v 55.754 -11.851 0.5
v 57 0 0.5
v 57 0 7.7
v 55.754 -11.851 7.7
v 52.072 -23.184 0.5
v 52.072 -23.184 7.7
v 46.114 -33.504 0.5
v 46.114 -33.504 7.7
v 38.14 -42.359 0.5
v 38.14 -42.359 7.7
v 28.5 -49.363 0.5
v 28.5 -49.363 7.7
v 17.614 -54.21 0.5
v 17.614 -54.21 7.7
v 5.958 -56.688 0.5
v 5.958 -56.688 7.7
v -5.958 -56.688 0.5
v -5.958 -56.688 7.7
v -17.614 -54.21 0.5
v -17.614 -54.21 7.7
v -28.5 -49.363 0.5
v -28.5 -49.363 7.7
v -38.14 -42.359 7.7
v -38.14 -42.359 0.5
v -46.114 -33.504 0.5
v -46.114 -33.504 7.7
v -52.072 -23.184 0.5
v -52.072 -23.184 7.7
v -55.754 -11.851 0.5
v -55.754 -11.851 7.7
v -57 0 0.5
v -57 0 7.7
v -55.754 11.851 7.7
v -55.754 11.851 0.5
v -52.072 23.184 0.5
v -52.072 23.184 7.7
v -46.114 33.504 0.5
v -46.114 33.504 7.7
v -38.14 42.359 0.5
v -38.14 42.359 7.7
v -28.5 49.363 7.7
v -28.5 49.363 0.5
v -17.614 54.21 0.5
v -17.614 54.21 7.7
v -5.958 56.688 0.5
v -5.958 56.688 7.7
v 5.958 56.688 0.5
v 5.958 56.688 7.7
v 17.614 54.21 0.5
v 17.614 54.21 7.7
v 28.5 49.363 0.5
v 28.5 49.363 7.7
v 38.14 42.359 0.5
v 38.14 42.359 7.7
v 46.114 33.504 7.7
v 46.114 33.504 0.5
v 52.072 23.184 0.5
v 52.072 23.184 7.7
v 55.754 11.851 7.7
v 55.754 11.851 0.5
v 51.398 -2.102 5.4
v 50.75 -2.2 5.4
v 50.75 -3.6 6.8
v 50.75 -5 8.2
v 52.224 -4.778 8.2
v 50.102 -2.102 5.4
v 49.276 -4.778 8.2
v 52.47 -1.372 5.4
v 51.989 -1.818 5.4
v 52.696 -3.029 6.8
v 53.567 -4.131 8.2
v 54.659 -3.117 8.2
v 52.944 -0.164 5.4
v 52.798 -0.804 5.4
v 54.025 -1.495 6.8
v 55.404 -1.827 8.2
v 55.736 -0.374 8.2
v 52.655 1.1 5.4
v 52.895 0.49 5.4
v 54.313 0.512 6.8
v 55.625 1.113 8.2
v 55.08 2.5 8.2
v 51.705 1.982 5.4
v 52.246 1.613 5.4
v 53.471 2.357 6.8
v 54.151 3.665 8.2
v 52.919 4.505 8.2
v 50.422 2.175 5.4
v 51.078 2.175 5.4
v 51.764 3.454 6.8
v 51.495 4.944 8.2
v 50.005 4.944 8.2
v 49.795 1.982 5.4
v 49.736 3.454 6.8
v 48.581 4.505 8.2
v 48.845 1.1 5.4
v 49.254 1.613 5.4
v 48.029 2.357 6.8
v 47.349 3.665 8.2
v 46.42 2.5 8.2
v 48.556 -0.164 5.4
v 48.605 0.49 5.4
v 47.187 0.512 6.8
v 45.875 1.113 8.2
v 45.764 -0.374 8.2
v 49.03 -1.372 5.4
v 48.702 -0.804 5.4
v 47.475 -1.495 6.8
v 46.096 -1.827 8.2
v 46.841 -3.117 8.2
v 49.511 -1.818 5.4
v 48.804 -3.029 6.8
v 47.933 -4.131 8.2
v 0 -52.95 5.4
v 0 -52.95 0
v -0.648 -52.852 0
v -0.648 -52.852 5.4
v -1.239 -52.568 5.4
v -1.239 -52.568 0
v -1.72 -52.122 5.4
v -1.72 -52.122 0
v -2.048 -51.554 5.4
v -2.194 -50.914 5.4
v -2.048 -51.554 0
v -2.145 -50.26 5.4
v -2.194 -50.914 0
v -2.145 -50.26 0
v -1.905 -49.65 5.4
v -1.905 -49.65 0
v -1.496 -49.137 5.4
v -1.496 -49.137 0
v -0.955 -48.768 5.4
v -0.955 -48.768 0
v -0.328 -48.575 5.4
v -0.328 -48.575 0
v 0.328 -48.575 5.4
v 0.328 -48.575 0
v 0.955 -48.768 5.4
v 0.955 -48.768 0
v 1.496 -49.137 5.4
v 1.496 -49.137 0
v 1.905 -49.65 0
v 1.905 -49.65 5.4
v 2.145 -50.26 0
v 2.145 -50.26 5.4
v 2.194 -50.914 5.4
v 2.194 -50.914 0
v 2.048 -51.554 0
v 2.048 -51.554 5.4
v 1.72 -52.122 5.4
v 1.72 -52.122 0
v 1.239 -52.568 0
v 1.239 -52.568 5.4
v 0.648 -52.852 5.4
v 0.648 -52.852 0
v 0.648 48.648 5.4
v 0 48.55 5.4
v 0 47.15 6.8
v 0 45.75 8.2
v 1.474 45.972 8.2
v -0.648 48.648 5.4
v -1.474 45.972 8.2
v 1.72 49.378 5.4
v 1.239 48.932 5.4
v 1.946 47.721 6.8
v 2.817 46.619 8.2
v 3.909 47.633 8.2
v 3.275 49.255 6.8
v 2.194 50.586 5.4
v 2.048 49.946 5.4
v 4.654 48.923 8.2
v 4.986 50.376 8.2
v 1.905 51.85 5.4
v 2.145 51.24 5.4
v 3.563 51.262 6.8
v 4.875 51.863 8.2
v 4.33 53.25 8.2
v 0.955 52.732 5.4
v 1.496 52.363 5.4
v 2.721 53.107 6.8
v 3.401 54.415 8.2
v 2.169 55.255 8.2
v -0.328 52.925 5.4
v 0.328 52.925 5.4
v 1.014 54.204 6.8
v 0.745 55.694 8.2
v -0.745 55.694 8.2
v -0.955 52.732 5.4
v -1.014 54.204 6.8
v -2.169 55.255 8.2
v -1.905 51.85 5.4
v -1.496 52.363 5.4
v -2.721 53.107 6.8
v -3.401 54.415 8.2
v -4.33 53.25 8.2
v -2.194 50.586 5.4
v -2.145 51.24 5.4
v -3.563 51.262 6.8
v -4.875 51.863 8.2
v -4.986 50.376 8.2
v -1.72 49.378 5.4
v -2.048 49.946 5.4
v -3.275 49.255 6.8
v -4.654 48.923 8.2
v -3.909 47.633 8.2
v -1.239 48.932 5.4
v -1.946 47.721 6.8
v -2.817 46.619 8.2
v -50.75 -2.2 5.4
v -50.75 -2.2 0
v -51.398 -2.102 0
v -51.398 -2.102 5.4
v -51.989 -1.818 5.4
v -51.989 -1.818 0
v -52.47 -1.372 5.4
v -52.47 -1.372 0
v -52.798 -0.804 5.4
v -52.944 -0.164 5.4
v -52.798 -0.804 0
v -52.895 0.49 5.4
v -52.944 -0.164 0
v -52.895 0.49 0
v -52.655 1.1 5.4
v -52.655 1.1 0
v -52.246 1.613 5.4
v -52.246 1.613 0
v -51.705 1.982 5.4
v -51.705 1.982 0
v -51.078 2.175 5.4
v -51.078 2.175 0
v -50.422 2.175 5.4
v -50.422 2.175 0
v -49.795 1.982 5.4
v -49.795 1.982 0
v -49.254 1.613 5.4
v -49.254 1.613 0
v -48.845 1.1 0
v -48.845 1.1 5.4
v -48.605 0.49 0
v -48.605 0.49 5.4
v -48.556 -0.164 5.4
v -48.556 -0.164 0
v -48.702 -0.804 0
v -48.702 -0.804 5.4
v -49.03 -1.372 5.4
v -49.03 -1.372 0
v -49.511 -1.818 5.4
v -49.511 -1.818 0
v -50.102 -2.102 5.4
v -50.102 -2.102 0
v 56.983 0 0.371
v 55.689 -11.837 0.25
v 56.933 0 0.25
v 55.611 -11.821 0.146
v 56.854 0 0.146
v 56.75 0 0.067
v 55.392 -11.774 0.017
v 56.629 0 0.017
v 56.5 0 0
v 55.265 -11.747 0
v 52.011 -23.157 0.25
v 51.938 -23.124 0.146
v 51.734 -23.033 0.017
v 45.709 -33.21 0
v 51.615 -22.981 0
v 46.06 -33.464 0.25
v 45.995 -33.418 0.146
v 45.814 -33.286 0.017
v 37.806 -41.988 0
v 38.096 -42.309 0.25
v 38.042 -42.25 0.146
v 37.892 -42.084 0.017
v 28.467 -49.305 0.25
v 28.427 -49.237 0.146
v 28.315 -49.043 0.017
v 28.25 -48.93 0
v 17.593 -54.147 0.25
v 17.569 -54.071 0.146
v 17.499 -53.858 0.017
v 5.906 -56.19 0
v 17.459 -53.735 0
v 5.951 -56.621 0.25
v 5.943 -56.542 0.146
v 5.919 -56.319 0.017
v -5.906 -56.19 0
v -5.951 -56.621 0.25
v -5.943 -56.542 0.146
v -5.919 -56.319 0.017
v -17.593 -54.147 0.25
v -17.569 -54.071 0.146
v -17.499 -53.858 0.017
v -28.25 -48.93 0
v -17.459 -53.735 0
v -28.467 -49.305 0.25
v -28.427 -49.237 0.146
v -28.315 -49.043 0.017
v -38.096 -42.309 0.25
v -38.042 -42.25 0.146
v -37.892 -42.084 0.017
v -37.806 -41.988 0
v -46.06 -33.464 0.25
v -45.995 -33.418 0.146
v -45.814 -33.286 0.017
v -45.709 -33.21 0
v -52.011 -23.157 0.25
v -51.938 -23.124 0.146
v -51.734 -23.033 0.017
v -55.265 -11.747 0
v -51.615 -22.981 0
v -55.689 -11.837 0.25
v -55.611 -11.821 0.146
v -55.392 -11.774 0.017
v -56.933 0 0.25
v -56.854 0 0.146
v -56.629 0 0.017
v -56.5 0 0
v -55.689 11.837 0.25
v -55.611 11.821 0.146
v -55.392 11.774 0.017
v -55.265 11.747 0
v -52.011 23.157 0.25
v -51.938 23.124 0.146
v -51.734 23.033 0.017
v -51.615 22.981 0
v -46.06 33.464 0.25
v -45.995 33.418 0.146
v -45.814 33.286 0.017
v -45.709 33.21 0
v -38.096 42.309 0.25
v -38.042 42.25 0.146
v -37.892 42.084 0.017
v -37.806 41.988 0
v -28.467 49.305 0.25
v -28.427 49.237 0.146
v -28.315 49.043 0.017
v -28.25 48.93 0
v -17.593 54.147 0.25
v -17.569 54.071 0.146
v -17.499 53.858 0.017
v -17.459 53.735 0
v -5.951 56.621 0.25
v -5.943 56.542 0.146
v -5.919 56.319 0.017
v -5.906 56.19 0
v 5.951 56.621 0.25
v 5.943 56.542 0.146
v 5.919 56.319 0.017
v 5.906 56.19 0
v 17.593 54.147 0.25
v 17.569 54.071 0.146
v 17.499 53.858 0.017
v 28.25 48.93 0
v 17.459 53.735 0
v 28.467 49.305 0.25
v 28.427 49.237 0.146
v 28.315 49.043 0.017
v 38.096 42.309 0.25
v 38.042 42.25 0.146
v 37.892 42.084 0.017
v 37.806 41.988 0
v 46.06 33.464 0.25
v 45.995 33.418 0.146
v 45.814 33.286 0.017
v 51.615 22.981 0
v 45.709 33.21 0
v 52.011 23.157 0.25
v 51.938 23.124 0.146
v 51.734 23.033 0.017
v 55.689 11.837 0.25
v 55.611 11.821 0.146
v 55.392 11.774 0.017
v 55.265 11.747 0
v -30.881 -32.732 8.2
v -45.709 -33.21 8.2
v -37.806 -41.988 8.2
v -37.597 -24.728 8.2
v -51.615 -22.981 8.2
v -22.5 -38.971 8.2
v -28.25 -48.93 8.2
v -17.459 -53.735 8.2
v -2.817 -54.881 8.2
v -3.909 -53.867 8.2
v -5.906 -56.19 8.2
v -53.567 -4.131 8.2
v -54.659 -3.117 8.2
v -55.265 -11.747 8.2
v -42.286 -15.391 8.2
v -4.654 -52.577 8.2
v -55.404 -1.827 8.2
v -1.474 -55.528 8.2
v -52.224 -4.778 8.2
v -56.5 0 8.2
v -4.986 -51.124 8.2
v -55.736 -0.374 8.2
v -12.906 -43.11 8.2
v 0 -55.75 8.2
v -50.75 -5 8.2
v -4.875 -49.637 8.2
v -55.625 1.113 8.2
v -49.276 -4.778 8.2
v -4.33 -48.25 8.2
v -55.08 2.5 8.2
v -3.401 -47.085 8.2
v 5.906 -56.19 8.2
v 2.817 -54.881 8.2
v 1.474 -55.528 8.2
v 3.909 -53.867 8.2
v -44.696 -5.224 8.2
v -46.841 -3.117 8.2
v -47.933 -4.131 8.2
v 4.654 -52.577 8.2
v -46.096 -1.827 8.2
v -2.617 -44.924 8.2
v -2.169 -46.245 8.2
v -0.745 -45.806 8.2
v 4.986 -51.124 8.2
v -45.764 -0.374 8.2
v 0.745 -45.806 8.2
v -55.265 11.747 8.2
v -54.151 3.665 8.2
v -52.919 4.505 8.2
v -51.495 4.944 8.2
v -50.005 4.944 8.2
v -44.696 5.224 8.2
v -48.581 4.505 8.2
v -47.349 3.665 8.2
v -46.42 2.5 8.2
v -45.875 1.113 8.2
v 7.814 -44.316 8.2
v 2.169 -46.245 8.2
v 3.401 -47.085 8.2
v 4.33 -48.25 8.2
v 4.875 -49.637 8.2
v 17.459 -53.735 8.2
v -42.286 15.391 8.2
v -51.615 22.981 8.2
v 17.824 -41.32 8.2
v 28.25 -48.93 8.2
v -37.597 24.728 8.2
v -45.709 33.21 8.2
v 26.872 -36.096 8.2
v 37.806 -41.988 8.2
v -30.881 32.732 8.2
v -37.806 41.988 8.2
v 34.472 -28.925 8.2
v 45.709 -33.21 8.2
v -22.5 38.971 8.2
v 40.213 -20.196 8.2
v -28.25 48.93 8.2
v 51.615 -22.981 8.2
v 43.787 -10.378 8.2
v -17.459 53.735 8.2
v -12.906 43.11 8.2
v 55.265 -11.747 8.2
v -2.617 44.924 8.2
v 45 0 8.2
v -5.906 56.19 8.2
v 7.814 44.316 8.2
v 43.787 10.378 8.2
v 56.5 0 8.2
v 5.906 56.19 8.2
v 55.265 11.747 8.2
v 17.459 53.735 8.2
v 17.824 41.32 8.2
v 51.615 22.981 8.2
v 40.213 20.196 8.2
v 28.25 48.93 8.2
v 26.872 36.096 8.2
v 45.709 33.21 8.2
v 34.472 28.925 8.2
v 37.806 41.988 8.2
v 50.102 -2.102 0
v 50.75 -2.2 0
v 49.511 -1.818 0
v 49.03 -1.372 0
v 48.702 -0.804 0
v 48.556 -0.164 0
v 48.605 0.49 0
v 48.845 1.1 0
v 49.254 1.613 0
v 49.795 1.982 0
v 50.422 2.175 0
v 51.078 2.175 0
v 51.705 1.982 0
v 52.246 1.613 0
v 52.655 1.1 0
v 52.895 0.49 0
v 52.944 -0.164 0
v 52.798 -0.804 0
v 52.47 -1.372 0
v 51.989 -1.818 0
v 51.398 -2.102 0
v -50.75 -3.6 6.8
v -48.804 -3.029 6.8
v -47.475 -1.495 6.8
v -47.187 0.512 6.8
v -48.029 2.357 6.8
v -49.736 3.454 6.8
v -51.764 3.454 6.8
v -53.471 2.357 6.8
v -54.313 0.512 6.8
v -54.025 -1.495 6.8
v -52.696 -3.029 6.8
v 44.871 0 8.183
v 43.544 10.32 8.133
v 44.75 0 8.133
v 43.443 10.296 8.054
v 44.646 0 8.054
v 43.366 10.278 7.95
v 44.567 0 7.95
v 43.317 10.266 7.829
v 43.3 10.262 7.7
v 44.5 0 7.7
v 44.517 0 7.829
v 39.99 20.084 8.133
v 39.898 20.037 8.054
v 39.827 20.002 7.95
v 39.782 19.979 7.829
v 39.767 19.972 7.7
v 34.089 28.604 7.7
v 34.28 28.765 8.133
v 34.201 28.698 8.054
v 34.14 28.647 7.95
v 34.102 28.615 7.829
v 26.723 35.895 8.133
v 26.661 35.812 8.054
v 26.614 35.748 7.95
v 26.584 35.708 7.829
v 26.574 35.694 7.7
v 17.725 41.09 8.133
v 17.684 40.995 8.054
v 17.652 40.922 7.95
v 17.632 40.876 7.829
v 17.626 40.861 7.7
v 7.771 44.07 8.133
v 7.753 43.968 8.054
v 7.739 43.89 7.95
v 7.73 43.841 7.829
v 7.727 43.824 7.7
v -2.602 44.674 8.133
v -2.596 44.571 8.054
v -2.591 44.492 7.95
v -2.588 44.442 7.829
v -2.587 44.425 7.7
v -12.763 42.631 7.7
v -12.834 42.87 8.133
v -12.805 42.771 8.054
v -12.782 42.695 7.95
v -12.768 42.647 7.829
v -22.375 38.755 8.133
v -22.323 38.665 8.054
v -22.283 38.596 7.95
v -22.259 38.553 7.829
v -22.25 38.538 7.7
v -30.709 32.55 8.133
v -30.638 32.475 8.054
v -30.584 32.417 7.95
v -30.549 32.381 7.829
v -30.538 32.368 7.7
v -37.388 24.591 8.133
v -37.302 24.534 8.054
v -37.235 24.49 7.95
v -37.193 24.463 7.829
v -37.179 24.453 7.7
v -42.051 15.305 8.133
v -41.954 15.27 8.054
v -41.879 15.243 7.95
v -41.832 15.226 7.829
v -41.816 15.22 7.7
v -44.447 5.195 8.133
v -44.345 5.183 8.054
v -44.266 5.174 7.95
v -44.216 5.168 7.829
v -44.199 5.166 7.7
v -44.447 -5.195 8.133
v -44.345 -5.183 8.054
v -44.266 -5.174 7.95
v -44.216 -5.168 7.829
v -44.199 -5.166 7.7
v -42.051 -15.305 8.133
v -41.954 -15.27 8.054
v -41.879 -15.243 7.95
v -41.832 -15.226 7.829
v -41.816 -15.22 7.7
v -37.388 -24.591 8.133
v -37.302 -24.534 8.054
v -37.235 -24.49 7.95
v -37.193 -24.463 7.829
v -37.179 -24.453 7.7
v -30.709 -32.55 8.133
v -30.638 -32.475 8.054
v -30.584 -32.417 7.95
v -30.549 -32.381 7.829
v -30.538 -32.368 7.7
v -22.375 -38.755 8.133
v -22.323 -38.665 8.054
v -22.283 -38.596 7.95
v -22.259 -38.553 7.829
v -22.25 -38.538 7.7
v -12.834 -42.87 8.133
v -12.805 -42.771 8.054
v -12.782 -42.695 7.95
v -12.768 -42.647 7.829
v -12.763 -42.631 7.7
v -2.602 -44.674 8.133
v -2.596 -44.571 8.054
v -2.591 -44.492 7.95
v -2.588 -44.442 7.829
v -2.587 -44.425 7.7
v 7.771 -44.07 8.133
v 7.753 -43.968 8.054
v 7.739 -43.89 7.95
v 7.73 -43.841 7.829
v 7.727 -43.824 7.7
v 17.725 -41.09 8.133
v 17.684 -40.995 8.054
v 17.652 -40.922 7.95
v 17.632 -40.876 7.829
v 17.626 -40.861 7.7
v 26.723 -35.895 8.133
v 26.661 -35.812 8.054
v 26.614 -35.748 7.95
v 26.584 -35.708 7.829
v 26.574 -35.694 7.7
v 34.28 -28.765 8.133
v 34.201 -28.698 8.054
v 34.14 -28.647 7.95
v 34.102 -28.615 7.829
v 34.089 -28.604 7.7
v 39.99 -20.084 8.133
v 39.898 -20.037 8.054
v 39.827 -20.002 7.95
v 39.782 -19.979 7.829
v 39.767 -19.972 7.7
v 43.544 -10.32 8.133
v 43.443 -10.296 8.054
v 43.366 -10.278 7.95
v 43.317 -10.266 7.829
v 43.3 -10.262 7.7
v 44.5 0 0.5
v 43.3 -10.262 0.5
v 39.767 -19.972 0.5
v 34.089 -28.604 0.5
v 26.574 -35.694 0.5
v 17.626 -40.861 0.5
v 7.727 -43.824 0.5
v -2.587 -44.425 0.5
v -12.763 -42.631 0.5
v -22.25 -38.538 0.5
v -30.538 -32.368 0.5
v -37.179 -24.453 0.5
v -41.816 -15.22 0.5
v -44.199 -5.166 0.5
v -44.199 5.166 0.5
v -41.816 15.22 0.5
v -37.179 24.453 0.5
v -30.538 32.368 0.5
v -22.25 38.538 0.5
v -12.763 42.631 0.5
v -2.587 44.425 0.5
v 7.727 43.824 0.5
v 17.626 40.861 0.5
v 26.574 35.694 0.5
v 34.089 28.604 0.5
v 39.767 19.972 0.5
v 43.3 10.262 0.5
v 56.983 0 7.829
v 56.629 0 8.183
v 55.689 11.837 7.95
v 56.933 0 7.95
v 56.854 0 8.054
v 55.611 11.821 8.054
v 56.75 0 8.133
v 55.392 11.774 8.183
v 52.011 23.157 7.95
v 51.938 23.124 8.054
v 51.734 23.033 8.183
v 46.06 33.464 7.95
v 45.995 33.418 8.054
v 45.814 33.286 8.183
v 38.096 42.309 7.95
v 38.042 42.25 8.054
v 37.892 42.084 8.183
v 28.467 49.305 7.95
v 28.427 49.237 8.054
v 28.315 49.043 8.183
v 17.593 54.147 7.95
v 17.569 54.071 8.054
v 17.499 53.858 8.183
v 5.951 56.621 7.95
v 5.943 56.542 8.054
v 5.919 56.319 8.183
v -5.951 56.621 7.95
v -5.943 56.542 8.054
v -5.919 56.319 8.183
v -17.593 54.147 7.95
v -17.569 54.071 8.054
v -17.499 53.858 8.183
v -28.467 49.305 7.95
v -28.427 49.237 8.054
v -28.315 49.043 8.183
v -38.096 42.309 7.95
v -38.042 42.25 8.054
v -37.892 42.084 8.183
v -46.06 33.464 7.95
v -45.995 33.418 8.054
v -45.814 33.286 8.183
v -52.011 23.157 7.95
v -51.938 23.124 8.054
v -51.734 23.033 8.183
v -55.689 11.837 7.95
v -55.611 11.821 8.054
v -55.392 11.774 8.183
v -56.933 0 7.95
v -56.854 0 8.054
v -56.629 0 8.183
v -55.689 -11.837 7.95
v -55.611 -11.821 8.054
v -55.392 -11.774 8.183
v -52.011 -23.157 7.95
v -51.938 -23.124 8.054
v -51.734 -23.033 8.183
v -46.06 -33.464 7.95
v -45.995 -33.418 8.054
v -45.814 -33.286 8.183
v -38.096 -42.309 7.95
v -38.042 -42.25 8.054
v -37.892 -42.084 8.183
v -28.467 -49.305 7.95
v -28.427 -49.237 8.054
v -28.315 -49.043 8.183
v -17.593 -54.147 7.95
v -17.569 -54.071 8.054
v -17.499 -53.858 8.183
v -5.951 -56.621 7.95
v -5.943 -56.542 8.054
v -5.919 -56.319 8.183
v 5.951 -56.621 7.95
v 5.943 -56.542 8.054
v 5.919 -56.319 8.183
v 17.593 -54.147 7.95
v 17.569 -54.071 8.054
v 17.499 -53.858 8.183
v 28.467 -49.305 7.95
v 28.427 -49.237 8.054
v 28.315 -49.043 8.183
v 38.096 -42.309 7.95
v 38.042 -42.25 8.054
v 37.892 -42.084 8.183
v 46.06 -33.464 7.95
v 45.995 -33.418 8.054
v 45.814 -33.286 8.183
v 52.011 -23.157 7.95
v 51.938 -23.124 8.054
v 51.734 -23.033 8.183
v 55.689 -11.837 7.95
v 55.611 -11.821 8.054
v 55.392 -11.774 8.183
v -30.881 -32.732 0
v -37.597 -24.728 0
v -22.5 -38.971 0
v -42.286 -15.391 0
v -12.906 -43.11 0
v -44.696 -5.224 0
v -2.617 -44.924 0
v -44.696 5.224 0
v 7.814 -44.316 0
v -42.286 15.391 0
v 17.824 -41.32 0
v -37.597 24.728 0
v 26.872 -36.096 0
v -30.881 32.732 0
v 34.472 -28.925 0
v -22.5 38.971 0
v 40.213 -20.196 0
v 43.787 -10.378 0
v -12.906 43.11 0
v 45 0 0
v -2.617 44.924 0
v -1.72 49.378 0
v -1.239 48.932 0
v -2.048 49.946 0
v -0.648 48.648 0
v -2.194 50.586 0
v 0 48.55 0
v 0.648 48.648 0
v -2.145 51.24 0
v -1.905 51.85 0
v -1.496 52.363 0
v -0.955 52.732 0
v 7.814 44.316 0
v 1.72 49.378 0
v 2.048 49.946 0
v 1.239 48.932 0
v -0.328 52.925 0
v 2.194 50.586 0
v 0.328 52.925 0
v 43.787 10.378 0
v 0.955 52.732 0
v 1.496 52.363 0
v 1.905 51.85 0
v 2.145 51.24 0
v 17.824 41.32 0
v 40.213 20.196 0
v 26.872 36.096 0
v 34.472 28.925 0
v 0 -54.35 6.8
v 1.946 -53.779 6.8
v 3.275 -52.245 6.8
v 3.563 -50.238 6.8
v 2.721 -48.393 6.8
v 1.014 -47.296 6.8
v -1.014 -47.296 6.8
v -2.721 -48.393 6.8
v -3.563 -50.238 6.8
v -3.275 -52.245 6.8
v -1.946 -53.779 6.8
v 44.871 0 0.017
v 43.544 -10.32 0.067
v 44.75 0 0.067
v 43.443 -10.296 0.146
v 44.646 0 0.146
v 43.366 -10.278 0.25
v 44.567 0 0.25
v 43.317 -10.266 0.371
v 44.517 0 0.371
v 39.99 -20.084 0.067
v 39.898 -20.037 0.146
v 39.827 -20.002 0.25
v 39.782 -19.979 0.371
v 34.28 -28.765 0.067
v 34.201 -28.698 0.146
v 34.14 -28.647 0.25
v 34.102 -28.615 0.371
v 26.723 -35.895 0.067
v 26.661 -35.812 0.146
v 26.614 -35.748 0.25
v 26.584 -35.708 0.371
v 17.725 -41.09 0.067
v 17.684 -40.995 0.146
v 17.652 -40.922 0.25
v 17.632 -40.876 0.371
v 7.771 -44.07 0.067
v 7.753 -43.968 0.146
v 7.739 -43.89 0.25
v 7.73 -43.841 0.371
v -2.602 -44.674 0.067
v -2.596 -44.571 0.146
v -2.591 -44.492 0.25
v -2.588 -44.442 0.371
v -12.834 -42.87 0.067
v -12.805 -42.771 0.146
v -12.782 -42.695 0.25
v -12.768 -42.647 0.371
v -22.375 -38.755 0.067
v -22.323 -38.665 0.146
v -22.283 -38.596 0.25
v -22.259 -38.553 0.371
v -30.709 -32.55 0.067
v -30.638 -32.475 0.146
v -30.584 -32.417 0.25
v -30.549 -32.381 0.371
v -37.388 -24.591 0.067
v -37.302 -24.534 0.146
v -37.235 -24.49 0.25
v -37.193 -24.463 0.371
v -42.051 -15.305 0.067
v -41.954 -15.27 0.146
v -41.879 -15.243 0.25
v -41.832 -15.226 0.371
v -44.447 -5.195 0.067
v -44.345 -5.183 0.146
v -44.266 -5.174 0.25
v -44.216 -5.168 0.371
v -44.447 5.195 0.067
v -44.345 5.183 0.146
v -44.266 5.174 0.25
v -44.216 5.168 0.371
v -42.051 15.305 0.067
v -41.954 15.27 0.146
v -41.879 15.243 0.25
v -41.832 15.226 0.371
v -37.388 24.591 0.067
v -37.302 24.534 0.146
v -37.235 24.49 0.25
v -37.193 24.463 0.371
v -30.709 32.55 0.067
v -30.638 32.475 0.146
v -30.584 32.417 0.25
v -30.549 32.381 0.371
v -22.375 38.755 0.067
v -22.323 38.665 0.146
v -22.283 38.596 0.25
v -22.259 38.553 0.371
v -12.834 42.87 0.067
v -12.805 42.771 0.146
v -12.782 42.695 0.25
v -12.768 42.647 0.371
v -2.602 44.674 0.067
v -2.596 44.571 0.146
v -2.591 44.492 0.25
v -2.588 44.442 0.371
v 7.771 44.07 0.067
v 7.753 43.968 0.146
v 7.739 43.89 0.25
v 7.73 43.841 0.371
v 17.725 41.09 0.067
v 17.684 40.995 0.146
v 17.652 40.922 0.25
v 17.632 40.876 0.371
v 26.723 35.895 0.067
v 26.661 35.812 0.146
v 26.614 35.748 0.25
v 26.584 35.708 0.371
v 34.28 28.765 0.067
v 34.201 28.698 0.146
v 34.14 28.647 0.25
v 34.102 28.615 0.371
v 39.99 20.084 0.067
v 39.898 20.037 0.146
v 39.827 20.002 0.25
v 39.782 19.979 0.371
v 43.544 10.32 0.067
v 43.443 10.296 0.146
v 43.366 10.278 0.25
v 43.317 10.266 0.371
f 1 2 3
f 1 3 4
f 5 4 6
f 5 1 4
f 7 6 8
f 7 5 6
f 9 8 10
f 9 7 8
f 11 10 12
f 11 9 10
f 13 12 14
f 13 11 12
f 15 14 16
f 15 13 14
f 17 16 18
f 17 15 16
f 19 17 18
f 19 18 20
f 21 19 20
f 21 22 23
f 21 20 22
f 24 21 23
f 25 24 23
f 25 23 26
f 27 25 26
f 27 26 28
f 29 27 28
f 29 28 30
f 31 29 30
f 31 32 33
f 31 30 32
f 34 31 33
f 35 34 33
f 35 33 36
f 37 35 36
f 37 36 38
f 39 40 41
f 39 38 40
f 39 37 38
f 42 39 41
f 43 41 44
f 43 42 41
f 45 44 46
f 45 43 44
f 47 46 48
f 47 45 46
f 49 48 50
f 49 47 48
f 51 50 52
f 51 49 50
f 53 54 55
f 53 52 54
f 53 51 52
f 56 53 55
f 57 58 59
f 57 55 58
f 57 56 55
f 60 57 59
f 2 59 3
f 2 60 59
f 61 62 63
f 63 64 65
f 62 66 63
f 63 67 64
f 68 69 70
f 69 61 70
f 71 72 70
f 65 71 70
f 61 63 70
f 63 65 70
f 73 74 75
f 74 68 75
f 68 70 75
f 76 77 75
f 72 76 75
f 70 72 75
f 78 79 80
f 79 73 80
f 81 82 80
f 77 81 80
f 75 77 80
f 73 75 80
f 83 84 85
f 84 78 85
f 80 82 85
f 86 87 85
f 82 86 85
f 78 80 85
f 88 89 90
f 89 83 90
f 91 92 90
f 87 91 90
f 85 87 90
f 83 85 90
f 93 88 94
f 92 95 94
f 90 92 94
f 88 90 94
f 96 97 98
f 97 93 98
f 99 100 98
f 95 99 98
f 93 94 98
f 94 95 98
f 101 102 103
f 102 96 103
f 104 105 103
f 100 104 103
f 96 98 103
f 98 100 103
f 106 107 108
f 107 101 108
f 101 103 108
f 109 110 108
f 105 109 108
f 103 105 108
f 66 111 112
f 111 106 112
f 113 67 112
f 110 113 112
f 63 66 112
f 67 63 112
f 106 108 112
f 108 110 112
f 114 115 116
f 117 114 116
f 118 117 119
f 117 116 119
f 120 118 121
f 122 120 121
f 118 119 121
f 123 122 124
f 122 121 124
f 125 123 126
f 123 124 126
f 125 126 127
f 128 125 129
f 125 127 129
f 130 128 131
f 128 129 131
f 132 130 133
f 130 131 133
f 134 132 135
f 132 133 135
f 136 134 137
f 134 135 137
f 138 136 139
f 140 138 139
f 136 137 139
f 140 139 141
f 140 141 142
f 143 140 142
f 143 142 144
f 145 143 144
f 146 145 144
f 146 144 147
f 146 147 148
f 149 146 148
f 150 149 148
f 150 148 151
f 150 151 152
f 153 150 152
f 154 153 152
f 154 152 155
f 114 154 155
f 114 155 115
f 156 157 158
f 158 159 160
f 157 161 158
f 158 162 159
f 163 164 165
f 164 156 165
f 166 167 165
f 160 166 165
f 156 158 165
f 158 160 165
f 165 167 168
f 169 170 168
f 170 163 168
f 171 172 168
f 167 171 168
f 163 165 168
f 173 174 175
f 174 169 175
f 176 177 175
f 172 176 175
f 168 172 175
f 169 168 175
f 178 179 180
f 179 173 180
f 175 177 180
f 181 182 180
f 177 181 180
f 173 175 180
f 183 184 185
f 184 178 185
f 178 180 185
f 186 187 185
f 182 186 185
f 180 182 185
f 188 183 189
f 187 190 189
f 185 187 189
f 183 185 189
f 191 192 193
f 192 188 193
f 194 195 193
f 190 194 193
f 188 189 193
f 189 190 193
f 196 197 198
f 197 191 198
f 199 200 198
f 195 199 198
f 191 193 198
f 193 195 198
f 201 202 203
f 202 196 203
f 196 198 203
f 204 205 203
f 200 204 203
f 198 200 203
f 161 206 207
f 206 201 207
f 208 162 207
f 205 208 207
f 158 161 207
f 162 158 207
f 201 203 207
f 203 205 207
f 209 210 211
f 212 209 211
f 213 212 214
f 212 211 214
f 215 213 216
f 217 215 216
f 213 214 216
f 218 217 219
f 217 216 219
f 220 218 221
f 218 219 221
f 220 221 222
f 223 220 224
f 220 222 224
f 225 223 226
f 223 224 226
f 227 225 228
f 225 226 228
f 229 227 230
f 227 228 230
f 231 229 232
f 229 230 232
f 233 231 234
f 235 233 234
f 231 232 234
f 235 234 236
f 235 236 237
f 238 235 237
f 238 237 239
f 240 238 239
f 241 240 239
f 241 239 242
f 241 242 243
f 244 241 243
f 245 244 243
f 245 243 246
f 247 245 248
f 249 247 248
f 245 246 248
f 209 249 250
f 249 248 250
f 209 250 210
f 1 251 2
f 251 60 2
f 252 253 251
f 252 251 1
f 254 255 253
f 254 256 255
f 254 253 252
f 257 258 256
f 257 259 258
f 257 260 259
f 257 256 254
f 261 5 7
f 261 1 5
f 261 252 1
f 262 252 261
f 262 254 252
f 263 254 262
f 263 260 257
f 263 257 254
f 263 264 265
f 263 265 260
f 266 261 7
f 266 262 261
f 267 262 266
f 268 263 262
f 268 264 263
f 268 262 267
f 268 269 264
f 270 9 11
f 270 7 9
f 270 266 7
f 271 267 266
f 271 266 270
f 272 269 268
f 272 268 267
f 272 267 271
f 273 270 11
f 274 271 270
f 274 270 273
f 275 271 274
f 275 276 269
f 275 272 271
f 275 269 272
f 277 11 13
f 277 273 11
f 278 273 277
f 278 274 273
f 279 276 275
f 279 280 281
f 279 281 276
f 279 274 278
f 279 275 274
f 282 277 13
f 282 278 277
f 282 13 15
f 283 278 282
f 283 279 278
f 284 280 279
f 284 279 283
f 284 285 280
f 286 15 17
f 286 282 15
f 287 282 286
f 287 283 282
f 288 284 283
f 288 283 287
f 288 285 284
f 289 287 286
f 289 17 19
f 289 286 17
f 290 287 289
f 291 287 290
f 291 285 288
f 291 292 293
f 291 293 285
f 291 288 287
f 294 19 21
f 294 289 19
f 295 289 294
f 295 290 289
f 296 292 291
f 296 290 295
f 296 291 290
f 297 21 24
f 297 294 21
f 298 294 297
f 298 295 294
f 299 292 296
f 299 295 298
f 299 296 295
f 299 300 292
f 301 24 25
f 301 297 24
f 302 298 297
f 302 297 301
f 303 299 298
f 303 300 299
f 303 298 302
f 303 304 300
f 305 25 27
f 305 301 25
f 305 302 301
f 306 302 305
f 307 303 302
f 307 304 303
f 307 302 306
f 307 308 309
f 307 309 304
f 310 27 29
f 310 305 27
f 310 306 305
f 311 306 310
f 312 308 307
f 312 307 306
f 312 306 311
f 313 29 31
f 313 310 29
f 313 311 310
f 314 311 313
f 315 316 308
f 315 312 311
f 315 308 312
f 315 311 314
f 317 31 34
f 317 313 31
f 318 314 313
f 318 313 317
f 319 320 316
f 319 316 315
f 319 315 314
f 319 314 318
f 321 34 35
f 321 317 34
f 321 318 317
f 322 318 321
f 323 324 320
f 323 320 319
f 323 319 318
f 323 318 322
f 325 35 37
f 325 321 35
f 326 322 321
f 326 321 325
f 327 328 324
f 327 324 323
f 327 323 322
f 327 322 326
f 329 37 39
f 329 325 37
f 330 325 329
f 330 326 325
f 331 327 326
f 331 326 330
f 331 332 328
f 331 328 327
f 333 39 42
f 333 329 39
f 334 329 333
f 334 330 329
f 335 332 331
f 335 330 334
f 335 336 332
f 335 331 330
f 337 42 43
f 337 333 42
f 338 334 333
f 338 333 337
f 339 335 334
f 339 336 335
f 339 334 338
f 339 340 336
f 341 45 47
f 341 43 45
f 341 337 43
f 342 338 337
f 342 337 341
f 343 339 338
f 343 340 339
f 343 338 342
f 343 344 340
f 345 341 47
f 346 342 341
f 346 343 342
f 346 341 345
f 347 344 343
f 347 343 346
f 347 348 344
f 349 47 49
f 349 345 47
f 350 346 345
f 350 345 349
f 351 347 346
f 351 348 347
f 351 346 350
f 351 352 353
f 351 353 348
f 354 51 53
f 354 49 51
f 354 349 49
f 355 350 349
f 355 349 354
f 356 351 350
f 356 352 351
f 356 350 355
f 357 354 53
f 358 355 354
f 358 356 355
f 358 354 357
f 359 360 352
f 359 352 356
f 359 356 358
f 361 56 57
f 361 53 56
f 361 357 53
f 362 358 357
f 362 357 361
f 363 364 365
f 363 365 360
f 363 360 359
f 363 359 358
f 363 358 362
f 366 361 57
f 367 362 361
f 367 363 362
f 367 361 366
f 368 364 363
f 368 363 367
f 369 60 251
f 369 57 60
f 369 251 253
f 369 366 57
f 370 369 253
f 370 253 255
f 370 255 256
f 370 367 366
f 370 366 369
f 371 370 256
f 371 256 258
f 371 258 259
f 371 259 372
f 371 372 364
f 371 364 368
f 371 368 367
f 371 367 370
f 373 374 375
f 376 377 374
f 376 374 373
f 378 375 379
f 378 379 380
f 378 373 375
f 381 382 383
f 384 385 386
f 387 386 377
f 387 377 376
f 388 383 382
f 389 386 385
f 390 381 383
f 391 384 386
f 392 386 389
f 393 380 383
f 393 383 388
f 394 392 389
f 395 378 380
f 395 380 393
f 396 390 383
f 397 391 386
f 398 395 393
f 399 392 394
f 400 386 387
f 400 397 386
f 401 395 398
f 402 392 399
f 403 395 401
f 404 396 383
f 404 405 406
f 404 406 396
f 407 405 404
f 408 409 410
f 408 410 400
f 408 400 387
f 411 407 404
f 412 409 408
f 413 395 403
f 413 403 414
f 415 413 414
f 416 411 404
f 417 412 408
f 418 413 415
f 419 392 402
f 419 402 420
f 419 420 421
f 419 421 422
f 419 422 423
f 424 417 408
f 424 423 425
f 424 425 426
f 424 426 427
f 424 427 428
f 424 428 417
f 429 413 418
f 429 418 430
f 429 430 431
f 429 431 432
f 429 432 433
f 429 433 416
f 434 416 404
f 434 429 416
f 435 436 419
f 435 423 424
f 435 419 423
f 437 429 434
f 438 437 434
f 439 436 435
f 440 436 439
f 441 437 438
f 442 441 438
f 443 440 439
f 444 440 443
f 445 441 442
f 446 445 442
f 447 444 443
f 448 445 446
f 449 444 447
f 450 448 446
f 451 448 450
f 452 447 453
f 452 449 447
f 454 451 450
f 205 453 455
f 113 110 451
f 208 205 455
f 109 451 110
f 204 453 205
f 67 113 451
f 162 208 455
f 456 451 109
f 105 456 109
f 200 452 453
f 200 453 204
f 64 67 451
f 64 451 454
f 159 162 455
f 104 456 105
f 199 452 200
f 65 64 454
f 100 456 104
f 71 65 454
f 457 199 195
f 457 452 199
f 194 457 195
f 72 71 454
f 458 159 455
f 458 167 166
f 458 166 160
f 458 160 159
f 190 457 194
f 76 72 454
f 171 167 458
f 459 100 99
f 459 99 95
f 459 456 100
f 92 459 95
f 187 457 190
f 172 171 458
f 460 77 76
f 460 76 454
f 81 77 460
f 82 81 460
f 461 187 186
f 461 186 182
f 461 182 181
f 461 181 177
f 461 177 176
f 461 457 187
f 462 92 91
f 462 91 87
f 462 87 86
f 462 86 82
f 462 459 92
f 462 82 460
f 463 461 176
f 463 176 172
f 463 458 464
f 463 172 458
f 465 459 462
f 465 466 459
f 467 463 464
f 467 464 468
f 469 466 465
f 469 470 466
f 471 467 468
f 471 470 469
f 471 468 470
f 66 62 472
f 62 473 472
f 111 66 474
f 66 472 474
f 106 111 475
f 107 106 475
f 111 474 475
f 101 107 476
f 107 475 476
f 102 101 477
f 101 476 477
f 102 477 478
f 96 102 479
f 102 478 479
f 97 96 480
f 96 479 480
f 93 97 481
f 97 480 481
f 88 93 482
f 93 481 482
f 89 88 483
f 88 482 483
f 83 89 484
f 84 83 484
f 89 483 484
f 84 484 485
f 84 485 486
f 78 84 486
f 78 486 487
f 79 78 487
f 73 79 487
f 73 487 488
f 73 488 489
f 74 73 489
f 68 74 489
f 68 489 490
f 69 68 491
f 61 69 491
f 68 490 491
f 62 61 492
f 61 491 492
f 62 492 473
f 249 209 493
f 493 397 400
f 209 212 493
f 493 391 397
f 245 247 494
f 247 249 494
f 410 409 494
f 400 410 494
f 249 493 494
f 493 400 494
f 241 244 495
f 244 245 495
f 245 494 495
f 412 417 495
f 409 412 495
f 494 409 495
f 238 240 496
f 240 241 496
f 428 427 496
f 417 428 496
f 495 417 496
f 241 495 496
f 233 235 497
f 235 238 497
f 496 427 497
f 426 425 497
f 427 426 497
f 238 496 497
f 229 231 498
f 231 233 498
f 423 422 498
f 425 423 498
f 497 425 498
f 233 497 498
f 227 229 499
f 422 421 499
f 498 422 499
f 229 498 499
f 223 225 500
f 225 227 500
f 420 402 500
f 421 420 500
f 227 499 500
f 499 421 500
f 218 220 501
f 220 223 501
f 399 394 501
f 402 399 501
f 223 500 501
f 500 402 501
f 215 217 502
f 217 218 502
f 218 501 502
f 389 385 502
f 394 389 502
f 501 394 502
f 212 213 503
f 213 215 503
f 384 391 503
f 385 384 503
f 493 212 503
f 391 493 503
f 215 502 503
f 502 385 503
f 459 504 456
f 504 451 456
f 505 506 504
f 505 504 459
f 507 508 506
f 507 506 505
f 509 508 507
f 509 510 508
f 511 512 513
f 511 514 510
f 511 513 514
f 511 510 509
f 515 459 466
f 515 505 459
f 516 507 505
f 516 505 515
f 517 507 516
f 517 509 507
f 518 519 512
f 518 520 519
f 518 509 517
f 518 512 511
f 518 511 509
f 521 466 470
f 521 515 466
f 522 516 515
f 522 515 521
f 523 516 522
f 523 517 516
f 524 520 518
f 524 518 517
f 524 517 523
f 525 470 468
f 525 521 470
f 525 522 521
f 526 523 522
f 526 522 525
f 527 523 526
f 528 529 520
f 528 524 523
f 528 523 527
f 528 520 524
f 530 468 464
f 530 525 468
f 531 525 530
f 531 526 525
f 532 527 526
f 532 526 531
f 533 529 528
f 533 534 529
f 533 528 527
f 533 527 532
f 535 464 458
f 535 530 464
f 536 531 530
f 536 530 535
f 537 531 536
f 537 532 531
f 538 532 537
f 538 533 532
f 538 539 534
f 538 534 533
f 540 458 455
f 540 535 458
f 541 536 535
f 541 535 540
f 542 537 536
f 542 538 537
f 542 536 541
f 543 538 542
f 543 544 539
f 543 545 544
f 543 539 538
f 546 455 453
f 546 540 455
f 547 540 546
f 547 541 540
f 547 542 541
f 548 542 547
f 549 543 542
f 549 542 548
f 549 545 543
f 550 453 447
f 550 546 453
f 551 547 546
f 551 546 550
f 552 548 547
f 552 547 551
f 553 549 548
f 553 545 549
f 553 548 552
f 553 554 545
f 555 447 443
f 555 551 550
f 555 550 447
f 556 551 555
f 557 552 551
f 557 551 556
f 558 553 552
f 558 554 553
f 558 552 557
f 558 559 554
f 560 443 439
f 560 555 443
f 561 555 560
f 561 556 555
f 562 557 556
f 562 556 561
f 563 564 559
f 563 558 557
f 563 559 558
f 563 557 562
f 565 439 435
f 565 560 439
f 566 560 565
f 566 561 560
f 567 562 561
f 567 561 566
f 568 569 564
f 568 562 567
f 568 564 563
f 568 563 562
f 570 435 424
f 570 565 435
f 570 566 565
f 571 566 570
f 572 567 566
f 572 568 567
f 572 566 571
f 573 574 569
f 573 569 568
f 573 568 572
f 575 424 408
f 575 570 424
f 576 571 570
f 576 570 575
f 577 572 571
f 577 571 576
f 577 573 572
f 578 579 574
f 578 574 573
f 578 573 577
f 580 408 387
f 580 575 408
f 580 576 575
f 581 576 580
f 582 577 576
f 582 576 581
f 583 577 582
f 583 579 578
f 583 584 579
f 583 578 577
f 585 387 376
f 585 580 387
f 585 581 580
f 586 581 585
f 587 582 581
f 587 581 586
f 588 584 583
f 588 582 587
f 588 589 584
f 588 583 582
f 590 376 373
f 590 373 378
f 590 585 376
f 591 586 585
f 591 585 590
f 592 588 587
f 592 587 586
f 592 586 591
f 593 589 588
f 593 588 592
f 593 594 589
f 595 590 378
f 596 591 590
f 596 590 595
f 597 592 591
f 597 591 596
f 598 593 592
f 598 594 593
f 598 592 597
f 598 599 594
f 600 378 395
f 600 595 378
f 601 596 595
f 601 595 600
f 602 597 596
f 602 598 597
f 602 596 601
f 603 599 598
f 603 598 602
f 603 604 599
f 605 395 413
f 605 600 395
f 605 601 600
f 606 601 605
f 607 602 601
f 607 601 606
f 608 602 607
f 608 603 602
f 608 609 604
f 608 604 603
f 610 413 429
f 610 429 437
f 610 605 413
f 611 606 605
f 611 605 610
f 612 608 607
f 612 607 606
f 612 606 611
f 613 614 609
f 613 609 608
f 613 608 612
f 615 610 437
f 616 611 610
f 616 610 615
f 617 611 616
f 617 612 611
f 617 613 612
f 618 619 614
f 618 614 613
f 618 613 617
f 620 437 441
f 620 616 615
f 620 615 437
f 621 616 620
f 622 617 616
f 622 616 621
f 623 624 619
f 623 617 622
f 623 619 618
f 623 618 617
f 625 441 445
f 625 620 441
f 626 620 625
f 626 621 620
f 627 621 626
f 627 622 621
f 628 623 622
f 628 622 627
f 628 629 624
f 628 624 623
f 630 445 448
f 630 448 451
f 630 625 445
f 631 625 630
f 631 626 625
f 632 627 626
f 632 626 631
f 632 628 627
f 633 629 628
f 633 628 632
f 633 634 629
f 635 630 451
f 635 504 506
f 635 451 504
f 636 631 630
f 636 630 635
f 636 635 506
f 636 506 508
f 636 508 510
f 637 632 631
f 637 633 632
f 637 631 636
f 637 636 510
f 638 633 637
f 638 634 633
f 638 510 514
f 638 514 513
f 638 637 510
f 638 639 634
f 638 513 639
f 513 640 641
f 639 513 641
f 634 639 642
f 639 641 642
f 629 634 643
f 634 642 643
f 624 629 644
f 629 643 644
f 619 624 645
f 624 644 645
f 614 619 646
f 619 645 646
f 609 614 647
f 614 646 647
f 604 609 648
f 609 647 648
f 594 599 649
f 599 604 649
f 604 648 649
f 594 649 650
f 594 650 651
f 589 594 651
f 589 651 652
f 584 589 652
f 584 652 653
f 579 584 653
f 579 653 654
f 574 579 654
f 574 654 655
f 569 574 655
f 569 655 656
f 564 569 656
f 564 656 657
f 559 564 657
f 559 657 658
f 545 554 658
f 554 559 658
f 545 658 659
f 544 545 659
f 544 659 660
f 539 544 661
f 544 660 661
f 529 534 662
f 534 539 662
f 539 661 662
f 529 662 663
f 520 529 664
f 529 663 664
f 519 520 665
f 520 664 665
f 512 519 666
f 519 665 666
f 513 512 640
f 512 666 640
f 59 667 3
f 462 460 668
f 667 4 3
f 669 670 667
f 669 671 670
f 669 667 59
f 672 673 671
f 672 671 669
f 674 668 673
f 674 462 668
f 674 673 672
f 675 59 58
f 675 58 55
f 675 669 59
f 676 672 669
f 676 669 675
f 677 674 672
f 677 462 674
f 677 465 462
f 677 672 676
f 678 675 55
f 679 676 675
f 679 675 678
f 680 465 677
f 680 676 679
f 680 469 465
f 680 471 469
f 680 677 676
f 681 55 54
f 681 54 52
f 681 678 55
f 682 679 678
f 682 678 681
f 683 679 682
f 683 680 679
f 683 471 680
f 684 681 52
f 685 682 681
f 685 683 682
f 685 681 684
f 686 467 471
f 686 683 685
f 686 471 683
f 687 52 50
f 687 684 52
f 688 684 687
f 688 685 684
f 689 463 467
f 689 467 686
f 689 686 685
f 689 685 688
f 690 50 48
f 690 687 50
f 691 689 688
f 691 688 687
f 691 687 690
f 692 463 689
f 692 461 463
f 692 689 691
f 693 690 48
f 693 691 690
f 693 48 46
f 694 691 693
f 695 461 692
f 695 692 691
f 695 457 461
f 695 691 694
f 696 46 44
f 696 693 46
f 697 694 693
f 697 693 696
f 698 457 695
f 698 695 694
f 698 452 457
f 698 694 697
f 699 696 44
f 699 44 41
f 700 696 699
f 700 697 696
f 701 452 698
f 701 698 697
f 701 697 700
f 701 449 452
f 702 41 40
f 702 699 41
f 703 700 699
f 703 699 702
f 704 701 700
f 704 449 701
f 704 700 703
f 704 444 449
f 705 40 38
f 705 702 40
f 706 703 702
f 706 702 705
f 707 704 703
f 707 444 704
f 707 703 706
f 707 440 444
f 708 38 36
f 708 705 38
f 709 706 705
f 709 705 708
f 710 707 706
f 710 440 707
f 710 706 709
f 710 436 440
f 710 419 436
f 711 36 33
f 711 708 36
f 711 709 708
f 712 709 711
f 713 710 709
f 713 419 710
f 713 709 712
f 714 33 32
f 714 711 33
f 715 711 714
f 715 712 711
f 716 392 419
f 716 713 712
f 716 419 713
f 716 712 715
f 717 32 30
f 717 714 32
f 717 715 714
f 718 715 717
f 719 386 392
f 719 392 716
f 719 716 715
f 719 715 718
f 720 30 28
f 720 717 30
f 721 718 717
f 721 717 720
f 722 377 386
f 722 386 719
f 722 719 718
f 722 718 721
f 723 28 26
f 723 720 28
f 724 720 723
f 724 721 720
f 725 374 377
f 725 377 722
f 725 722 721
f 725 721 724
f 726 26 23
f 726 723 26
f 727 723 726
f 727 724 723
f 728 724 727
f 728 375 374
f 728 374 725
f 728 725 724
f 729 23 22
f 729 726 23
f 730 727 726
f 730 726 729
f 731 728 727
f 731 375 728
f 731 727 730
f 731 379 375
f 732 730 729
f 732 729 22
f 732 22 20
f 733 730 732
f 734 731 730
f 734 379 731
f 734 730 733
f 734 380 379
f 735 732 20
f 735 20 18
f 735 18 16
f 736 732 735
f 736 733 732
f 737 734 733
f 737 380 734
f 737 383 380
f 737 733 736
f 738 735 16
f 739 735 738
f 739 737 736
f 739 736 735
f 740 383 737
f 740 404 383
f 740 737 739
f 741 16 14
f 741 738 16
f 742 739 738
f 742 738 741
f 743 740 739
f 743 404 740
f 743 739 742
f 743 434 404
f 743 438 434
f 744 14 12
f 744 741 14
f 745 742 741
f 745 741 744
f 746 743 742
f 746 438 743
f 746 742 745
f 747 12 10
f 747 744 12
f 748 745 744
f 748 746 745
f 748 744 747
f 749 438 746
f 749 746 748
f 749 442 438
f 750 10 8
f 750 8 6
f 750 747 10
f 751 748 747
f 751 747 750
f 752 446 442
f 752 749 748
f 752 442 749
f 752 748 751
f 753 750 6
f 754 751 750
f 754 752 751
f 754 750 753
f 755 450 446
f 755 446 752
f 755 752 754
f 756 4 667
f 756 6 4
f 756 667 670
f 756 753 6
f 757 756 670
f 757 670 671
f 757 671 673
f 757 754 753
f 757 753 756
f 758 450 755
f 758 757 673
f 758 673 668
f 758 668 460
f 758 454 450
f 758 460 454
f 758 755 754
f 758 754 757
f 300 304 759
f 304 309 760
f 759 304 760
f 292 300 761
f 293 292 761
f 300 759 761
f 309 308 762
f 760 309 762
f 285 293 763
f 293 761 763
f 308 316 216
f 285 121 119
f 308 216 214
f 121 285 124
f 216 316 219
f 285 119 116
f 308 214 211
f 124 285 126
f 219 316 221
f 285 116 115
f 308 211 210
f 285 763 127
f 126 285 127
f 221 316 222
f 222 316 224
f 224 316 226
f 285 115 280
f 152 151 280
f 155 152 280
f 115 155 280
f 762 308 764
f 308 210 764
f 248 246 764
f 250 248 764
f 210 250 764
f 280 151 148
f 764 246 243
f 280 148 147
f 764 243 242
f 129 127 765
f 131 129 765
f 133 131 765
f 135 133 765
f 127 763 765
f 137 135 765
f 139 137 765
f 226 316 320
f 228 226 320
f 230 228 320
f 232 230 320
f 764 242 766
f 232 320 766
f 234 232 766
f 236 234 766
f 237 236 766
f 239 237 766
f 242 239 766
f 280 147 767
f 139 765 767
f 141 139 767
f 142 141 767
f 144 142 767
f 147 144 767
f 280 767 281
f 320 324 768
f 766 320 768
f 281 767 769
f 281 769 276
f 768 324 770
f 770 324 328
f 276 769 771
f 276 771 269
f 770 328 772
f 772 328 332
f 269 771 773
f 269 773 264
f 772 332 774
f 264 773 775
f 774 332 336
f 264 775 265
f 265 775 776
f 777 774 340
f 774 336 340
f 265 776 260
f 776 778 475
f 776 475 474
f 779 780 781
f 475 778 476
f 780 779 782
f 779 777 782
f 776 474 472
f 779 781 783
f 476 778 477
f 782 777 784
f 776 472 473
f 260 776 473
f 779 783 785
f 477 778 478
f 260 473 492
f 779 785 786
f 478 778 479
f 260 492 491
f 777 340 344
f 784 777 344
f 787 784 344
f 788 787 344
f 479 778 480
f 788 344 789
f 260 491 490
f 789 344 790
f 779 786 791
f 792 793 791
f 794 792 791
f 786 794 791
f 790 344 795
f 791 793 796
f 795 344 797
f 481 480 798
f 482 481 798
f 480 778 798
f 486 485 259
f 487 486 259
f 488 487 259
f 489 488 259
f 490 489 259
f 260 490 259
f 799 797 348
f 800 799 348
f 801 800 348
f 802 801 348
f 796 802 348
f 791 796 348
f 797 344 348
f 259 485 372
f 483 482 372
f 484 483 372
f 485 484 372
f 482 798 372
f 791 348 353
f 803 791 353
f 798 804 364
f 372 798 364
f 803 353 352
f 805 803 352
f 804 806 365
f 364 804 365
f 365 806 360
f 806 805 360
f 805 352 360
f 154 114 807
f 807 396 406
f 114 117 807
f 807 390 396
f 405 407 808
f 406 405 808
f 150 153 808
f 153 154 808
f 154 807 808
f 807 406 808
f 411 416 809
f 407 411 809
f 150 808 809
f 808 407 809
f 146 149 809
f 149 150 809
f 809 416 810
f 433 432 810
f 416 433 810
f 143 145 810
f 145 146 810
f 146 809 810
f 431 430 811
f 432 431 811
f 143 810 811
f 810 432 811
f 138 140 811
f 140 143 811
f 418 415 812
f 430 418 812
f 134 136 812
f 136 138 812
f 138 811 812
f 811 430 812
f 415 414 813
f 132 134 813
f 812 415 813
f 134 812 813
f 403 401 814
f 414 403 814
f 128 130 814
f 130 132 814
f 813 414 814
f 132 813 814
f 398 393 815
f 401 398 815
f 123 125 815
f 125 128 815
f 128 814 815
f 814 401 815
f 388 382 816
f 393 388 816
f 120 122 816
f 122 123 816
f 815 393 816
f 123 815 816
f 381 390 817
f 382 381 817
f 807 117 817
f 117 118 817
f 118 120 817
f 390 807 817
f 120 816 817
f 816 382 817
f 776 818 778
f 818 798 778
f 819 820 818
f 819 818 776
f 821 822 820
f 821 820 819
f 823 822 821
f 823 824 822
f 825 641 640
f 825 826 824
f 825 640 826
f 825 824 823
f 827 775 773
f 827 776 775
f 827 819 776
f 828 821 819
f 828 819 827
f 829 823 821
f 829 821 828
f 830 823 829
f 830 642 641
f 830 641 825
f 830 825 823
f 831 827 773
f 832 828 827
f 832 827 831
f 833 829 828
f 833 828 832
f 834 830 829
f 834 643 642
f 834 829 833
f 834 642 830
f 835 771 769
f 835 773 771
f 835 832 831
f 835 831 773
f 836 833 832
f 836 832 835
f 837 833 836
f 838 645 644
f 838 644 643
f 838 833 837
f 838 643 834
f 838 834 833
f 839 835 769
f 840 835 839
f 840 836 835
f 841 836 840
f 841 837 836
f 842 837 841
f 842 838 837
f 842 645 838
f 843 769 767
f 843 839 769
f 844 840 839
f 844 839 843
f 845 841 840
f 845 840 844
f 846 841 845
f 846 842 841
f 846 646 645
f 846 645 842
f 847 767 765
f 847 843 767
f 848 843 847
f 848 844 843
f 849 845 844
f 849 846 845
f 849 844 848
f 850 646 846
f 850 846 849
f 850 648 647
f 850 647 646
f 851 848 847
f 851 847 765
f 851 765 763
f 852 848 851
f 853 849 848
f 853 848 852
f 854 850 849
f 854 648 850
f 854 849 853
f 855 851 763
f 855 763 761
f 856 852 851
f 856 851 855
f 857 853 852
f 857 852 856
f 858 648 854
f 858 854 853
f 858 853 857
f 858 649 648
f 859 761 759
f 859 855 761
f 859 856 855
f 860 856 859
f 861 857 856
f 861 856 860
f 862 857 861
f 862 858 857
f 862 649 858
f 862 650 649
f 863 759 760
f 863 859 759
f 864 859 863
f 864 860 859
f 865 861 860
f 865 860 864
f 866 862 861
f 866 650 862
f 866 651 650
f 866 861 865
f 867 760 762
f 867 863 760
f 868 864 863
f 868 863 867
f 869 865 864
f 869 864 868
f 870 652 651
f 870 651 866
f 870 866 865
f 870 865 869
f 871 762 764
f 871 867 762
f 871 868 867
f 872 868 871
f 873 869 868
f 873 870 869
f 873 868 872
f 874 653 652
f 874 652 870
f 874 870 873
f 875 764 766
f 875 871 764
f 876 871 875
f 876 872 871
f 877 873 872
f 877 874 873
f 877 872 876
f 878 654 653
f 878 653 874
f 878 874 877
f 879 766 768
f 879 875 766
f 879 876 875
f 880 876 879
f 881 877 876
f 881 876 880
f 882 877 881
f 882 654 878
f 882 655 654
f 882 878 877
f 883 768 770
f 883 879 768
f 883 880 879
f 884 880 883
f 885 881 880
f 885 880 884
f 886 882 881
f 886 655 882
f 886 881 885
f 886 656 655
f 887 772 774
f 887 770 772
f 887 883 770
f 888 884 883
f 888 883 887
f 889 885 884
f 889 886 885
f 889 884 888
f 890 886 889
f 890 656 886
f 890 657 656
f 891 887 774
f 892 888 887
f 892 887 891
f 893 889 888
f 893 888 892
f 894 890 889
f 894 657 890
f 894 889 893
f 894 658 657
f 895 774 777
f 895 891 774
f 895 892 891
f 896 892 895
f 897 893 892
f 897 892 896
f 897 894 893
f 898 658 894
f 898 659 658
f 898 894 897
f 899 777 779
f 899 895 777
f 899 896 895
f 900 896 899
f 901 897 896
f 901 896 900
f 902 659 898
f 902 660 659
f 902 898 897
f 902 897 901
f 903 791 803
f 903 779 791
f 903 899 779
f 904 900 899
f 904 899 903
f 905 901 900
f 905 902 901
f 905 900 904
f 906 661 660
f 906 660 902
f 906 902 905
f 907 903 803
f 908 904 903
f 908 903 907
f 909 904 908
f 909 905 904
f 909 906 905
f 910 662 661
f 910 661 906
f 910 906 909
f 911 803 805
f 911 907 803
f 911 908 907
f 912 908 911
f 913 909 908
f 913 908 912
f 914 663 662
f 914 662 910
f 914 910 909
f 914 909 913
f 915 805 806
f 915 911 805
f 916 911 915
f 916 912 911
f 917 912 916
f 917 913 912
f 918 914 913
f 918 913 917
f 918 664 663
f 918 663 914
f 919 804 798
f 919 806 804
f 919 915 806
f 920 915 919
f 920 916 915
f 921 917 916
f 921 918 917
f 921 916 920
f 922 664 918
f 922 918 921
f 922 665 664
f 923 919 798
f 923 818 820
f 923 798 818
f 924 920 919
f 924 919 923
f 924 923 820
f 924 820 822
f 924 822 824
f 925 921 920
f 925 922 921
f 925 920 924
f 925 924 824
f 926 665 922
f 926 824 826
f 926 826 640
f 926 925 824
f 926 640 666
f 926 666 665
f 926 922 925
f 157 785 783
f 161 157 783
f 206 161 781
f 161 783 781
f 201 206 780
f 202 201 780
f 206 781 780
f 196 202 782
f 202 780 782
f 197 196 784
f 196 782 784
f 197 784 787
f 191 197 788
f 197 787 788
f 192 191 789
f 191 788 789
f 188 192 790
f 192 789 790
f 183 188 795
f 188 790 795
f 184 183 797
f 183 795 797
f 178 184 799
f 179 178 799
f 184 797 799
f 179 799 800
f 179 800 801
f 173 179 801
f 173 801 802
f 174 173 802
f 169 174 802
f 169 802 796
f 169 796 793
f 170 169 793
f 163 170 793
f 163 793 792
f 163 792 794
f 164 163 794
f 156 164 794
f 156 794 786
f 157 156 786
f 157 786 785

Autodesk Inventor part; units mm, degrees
ref_plane "YZ Plane" through (0, 0, 0) normal (1, 0, 0) x (0, 1, 0)
ref_plane "XZ Plane" through (0, 0, 0) normal (0, 1, 0) x (-1, 0, 0)
ref_plane "XY Plane" through (0, 0, 0) normal (0, 0, 1) x (1, 0, 0)
sketch "スケッチ1" plane through (0, 0, 0) normal (0, 0, 1) x (1, 0, 0)
  circle A0 centre (0, 0) radius 57
  circle A1 centre (0, 0) radius 44.5
  dimension "d0" = 114
  dimension "d1" = 89
extrude "押し出し1" add sketch "スケッチ1" along normal blind 8.2
sketch "スケッチ2" plane through (0, 0, 8.2) normal (0, 0, 1) x (1, 0, 0)
  point P0 (0, 0)
  point P1 (0, -50.75)
  point P2 (50.75, 0)
  point P3 (0, 50.75)
  point P4 (-50.75, 0)
  dimension "d4" = 50.75
  dimension "d7" = 360
hole "穴1" at (0, -50.75, 8.2) at (50.75, 0, 8.2) at (0, 50.75, 8.2) at (-50.75, 0, 8.2) direction (0, 0, -1) diameter 4.4 end through all countersink diameter 10 countersink angle 90
fillet "フィレット1" radius 0.5 4 edges at (-57, 0, 8.2) (-44.5, 0, 8.2) (-57, 0, 0) (-44.5, 0, 0)
properties part number "TurnTable140_Inner" material "鋼、合金"
